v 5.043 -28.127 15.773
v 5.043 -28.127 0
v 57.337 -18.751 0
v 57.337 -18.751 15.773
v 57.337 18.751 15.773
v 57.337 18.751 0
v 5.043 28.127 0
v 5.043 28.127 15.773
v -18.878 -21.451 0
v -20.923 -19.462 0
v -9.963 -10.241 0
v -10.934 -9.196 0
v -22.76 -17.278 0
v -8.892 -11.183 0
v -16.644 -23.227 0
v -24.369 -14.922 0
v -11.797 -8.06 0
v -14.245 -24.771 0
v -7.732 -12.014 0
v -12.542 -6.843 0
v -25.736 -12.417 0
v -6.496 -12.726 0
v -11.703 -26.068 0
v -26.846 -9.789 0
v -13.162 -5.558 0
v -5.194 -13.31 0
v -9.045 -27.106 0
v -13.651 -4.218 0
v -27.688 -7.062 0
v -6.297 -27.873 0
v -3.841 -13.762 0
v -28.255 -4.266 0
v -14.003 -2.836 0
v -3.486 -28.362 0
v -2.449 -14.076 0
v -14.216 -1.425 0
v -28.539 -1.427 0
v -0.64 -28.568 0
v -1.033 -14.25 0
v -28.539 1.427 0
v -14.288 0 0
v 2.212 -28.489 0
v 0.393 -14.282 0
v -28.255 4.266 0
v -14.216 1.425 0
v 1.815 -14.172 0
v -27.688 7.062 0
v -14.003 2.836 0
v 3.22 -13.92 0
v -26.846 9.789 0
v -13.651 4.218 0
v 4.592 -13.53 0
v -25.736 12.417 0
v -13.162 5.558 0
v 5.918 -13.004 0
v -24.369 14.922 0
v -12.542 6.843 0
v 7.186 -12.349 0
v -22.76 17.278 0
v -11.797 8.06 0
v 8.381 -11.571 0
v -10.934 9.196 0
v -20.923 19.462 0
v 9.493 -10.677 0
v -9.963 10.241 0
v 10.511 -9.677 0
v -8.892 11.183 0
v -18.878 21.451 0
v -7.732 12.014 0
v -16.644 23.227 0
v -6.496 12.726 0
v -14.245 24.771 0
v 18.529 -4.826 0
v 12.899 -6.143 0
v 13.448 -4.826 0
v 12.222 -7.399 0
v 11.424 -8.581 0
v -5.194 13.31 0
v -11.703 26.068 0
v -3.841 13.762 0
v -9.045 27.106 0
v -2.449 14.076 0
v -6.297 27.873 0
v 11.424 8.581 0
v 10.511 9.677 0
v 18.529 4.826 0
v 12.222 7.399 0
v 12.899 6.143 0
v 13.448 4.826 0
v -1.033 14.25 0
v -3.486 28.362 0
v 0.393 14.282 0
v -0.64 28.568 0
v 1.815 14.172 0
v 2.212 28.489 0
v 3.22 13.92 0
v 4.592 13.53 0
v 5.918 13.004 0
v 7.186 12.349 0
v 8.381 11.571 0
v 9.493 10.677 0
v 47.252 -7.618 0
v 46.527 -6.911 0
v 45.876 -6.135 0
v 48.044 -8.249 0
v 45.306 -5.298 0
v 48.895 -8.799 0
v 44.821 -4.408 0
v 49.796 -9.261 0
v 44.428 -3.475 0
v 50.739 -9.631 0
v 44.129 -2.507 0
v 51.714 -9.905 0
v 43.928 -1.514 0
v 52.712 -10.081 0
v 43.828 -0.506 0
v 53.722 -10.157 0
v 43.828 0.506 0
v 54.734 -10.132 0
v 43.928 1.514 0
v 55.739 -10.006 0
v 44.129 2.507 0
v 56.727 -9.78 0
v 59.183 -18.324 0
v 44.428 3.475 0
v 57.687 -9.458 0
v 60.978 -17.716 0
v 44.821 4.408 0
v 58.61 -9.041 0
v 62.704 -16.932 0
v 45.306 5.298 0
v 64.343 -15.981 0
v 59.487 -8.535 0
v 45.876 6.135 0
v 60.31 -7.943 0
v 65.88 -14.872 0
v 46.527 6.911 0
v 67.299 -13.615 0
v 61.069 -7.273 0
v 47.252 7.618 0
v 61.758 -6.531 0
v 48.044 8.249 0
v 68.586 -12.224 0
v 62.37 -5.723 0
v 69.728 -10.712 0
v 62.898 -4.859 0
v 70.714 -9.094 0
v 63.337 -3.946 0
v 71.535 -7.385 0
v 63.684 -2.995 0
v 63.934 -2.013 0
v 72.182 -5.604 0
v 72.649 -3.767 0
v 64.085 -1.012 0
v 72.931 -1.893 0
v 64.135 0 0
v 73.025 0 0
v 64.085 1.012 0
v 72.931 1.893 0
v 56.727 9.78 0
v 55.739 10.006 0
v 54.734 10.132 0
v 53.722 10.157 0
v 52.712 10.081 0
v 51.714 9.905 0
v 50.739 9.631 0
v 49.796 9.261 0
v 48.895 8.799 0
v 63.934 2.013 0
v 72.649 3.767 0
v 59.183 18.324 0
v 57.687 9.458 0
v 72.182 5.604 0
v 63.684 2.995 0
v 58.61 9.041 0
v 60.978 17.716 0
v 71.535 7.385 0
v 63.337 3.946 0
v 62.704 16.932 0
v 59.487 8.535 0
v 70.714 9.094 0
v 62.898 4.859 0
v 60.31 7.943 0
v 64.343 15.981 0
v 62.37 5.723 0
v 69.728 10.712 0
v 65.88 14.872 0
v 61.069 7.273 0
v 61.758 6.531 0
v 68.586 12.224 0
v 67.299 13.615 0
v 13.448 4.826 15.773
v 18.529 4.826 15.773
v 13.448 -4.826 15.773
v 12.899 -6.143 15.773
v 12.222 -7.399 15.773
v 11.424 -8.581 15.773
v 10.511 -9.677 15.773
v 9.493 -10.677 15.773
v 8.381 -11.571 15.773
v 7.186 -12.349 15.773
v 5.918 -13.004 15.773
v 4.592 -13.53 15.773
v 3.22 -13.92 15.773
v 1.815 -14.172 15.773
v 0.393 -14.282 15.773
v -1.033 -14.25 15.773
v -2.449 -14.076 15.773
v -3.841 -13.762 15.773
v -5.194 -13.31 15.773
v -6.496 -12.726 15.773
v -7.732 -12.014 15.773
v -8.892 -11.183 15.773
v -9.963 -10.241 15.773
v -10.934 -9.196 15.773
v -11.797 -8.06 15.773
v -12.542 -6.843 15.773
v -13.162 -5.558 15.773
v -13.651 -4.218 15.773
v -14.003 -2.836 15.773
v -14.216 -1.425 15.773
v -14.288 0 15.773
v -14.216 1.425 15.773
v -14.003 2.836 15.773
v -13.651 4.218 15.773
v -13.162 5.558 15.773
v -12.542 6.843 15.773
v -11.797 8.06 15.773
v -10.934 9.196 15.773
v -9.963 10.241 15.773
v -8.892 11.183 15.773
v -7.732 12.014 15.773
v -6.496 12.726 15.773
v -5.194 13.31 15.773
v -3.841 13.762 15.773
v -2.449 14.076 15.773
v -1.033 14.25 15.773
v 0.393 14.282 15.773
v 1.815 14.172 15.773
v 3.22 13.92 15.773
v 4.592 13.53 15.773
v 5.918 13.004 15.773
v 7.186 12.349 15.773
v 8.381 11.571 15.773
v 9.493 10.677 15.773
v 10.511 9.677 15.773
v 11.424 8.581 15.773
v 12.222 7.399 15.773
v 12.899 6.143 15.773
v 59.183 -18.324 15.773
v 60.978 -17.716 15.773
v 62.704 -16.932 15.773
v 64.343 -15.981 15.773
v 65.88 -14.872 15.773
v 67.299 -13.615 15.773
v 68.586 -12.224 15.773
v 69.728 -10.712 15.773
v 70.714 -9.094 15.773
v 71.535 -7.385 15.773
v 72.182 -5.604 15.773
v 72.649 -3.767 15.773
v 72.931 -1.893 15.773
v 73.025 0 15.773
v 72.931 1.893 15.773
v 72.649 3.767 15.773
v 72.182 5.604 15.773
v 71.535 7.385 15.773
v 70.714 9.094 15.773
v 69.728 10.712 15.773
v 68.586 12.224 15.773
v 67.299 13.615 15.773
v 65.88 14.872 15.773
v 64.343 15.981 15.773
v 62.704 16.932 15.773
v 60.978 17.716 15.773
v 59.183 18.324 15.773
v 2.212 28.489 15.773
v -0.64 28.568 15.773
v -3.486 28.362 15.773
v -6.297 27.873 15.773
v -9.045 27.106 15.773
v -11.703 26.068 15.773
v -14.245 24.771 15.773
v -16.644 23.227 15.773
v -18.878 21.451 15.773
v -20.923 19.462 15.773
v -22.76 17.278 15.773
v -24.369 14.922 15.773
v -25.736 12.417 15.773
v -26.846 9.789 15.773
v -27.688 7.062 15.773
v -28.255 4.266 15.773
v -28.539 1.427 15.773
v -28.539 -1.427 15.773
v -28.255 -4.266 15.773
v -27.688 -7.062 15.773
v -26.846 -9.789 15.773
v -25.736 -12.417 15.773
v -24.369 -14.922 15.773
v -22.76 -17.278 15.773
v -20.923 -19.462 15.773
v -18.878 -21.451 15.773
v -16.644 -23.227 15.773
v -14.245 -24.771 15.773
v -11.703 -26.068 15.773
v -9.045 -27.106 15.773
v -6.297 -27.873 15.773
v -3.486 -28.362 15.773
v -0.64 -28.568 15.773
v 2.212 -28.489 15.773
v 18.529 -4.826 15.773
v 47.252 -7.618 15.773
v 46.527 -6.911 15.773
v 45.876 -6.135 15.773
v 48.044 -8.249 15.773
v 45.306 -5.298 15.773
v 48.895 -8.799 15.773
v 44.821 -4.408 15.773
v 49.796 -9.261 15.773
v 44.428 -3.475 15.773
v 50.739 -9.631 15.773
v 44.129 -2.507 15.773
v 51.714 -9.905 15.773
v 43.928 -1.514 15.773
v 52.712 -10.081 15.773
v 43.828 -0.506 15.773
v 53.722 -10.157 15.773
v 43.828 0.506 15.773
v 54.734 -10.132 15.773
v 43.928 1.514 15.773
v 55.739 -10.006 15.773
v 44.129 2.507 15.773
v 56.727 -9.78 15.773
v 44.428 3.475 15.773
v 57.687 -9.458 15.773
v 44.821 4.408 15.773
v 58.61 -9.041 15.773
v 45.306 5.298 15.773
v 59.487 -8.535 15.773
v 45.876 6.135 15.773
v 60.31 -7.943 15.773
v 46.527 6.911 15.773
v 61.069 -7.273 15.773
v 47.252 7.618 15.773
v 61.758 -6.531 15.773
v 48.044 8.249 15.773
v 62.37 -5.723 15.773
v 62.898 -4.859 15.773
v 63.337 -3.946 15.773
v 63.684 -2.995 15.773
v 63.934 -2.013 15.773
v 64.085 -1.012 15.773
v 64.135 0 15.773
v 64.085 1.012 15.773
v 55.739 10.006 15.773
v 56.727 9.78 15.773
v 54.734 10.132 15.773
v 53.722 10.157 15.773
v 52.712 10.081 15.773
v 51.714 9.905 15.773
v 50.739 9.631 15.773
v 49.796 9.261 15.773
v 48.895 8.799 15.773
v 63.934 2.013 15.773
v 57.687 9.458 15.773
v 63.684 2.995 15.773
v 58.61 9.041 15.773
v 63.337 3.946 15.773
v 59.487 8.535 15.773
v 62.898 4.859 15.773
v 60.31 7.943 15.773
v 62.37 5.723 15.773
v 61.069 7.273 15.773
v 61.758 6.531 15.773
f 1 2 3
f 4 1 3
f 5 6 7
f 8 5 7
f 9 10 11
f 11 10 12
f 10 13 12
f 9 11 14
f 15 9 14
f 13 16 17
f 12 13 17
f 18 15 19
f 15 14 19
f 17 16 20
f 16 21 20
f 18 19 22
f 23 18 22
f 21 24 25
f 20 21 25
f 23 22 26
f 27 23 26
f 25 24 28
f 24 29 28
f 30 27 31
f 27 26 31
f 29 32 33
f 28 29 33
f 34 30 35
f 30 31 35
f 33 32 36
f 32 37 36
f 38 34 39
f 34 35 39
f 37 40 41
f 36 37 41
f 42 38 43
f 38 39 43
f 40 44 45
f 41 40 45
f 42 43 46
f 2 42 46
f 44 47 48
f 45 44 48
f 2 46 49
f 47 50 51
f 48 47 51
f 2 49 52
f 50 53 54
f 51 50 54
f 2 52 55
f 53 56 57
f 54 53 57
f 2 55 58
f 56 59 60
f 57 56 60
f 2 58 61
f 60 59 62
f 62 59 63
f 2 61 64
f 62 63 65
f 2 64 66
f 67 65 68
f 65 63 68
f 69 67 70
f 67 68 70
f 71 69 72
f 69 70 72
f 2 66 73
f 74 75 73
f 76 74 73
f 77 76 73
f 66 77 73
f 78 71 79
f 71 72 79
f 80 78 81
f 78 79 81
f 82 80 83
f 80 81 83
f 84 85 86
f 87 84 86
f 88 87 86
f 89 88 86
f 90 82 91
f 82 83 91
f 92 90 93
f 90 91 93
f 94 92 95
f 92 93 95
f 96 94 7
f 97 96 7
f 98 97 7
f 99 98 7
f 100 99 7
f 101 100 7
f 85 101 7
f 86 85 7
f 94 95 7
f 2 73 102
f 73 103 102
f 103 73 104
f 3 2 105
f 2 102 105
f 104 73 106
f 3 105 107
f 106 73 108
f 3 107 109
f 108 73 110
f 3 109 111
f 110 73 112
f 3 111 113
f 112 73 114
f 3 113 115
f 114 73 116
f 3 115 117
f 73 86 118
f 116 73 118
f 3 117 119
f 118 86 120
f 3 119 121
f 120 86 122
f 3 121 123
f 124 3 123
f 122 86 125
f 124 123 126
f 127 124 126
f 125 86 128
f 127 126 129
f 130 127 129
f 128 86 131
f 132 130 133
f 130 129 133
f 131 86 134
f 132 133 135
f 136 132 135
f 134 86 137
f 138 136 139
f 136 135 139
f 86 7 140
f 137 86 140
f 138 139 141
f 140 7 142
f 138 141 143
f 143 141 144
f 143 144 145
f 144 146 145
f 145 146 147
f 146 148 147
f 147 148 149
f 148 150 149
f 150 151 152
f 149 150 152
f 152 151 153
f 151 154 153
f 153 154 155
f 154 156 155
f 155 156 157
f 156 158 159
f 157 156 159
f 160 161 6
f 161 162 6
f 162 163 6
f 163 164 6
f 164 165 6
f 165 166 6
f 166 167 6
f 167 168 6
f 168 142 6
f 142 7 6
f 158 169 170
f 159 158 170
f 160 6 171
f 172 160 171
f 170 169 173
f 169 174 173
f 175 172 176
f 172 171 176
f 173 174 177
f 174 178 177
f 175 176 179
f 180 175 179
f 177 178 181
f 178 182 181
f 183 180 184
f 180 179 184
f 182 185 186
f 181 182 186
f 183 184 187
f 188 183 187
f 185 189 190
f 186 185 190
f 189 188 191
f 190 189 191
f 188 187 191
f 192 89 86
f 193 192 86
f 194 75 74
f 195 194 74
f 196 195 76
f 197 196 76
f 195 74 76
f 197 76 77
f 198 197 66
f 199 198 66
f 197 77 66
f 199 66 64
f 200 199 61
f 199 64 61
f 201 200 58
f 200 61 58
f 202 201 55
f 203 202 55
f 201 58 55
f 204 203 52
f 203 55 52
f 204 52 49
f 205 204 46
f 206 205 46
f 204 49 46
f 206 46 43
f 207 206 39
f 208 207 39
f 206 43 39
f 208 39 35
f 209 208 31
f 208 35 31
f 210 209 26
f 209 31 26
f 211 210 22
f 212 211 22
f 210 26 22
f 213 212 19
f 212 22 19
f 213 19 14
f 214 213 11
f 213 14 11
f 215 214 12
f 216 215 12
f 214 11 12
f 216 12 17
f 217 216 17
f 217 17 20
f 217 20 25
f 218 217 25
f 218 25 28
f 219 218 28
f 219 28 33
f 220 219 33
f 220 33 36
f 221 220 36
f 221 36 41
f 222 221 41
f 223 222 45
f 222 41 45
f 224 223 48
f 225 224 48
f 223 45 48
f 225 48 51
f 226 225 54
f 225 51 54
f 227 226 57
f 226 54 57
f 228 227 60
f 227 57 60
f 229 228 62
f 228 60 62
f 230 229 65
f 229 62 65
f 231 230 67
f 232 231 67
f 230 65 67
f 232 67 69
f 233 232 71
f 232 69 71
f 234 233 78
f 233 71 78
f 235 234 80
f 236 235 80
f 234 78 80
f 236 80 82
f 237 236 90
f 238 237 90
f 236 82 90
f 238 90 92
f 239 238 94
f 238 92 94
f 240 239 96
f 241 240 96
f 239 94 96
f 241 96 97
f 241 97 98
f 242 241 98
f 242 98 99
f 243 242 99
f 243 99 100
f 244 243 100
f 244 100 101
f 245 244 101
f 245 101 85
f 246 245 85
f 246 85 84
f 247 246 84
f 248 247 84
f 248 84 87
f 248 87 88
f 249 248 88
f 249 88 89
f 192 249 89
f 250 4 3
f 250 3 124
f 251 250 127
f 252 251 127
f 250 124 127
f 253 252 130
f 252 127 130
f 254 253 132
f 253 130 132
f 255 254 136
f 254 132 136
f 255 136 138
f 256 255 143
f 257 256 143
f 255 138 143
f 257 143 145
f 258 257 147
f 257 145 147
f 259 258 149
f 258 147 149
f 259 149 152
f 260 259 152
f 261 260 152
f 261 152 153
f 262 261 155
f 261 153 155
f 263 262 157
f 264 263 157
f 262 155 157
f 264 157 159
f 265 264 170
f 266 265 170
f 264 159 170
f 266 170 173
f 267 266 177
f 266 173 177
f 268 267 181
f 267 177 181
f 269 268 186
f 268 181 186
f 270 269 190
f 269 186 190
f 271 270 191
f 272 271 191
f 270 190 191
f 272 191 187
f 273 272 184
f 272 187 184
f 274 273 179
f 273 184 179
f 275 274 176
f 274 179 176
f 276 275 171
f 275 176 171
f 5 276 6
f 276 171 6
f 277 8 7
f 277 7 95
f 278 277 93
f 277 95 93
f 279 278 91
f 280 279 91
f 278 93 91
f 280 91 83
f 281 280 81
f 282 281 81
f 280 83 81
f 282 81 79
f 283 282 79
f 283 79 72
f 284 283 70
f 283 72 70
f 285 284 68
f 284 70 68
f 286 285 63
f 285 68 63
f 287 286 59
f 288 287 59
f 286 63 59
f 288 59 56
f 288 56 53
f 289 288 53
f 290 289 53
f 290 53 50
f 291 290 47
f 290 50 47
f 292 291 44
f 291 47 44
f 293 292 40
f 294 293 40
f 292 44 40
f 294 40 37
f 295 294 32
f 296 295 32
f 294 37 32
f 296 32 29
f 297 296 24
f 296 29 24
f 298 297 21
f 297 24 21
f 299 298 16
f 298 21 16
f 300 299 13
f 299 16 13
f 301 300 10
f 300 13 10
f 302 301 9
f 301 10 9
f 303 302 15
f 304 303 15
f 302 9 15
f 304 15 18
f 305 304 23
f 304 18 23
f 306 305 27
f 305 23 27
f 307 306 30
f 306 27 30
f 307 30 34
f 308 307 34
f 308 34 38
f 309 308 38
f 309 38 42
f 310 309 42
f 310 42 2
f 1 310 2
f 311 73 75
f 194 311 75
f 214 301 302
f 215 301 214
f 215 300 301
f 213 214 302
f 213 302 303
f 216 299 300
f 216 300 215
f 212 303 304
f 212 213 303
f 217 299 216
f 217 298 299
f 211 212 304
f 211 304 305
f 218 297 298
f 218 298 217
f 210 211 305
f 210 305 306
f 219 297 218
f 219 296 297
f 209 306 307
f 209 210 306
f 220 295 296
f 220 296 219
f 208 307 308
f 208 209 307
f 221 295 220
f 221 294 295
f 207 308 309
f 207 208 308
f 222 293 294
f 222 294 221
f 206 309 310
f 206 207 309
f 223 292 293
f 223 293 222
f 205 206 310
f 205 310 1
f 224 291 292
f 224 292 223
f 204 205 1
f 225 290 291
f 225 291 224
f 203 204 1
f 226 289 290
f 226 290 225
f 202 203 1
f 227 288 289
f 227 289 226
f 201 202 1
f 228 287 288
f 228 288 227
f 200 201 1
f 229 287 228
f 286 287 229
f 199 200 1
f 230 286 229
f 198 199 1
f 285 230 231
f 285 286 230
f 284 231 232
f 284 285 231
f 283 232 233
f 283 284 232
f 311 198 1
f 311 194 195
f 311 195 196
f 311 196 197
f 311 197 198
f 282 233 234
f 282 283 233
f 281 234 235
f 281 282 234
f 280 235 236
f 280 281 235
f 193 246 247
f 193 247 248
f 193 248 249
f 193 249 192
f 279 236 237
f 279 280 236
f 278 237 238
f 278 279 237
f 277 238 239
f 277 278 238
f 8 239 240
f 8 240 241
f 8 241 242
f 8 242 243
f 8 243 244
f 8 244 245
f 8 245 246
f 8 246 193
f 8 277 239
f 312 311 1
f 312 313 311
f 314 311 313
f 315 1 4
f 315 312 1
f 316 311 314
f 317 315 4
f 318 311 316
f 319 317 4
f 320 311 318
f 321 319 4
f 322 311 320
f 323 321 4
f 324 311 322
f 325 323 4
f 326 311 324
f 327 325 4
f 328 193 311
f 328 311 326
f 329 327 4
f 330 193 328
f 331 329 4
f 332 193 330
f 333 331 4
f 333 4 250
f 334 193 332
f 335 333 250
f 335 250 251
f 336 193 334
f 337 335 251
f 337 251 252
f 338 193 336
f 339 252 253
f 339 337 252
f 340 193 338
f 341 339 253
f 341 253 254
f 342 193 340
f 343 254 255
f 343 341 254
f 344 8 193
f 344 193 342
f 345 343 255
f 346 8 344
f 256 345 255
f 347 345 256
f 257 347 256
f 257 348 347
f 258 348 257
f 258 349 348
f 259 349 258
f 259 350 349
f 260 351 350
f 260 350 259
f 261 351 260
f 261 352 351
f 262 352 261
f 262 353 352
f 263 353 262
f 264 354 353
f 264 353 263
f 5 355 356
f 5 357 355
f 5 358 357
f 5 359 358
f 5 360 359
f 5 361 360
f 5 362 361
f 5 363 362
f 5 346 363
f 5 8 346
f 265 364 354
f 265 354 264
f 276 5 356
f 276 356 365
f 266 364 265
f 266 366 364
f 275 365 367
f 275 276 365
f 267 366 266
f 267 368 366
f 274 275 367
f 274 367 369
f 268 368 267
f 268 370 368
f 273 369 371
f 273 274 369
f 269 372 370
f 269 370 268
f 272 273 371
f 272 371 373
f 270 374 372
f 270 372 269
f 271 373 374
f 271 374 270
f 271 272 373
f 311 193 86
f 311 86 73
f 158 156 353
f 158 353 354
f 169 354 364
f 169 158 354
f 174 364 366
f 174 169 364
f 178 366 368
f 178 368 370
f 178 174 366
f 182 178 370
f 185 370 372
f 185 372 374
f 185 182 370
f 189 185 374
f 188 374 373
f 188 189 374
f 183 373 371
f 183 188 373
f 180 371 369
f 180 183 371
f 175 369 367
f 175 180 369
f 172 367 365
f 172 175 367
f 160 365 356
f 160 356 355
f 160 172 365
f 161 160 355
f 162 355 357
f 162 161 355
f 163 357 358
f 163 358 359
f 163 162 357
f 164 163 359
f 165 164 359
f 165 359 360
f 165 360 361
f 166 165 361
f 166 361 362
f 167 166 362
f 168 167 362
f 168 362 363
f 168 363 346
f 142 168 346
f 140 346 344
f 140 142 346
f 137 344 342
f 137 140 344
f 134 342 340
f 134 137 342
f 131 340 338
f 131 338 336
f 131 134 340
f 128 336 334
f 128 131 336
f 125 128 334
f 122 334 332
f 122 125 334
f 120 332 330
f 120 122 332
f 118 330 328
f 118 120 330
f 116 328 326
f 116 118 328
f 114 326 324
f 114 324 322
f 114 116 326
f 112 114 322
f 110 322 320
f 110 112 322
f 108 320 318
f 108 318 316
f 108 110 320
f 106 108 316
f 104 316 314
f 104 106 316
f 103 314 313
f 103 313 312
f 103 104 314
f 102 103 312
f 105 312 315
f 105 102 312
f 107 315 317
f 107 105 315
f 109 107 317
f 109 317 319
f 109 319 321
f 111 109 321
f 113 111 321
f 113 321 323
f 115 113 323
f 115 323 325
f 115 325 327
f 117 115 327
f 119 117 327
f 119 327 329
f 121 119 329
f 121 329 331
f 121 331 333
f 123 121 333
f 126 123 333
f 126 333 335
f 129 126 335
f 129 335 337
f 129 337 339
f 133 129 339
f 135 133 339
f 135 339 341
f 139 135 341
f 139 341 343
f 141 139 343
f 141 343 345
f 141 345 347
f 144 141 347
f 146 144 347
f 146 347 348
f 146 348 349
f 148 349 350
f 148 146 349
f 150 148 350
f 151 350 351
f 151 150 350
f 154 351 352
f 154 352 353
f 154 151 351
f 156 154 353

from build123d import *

# Parameters (mm, degrees)
F0_R     = 10.16
F1_DEPTH = 15.7734


with BuildPart() as f1:
    # F0 (on Top) → F1 (new body)
    with BuildSketch(Plane.XY):
        with BuildLine():
            ThreePointArc((5.042647, 28.126541), (-28.575, 0), (5.042647, -28.126541))
            ThreePointArc((5.042647, -28.126541), (21.916025, -18.336262), (28.575, 0))
            ThreePointArc((28.575, 0), (21.916025, 18.336262), (5.042647, 28.126541))
        make_face()
        with BuildLine():
            ThreePointArc((13.447765, -4.826), (-14.2875, 0), (13.447765, 4.826))
            Line((13.447765, 4.826), (18.5293, 4.826))
            Line((18.5293, 4.826), (18.5293, -4.826))
            Line((18.5293, -4.826), (13.447765, -4.826))
        make_face(mode=Mode.SUBTRACT)
        with BuildLine():
            Line((5.042647, -28.126541), (57.336765, -18.751028))
            ThreePointArc((57.336765, -18.751028), (73.025, 0), (57.336765, 18.751028))
            Line((57.336765, 18.751028), (5.042647, 28.126541))
            ThreePointArc((5.042647, 28.126541), (21.916025, 18.336262), (28.575, 0))
            ThreePointArc((28.575, 0), (21.916025, -18.336262), (5.042647, -28.126541))
        make_face()
        with Locations((53.975, 0)):
            Circle(F0_R, mode=Mode.SUBTRACT)
    extrude(amount=F1_DEPTH)


solid = f1.part
